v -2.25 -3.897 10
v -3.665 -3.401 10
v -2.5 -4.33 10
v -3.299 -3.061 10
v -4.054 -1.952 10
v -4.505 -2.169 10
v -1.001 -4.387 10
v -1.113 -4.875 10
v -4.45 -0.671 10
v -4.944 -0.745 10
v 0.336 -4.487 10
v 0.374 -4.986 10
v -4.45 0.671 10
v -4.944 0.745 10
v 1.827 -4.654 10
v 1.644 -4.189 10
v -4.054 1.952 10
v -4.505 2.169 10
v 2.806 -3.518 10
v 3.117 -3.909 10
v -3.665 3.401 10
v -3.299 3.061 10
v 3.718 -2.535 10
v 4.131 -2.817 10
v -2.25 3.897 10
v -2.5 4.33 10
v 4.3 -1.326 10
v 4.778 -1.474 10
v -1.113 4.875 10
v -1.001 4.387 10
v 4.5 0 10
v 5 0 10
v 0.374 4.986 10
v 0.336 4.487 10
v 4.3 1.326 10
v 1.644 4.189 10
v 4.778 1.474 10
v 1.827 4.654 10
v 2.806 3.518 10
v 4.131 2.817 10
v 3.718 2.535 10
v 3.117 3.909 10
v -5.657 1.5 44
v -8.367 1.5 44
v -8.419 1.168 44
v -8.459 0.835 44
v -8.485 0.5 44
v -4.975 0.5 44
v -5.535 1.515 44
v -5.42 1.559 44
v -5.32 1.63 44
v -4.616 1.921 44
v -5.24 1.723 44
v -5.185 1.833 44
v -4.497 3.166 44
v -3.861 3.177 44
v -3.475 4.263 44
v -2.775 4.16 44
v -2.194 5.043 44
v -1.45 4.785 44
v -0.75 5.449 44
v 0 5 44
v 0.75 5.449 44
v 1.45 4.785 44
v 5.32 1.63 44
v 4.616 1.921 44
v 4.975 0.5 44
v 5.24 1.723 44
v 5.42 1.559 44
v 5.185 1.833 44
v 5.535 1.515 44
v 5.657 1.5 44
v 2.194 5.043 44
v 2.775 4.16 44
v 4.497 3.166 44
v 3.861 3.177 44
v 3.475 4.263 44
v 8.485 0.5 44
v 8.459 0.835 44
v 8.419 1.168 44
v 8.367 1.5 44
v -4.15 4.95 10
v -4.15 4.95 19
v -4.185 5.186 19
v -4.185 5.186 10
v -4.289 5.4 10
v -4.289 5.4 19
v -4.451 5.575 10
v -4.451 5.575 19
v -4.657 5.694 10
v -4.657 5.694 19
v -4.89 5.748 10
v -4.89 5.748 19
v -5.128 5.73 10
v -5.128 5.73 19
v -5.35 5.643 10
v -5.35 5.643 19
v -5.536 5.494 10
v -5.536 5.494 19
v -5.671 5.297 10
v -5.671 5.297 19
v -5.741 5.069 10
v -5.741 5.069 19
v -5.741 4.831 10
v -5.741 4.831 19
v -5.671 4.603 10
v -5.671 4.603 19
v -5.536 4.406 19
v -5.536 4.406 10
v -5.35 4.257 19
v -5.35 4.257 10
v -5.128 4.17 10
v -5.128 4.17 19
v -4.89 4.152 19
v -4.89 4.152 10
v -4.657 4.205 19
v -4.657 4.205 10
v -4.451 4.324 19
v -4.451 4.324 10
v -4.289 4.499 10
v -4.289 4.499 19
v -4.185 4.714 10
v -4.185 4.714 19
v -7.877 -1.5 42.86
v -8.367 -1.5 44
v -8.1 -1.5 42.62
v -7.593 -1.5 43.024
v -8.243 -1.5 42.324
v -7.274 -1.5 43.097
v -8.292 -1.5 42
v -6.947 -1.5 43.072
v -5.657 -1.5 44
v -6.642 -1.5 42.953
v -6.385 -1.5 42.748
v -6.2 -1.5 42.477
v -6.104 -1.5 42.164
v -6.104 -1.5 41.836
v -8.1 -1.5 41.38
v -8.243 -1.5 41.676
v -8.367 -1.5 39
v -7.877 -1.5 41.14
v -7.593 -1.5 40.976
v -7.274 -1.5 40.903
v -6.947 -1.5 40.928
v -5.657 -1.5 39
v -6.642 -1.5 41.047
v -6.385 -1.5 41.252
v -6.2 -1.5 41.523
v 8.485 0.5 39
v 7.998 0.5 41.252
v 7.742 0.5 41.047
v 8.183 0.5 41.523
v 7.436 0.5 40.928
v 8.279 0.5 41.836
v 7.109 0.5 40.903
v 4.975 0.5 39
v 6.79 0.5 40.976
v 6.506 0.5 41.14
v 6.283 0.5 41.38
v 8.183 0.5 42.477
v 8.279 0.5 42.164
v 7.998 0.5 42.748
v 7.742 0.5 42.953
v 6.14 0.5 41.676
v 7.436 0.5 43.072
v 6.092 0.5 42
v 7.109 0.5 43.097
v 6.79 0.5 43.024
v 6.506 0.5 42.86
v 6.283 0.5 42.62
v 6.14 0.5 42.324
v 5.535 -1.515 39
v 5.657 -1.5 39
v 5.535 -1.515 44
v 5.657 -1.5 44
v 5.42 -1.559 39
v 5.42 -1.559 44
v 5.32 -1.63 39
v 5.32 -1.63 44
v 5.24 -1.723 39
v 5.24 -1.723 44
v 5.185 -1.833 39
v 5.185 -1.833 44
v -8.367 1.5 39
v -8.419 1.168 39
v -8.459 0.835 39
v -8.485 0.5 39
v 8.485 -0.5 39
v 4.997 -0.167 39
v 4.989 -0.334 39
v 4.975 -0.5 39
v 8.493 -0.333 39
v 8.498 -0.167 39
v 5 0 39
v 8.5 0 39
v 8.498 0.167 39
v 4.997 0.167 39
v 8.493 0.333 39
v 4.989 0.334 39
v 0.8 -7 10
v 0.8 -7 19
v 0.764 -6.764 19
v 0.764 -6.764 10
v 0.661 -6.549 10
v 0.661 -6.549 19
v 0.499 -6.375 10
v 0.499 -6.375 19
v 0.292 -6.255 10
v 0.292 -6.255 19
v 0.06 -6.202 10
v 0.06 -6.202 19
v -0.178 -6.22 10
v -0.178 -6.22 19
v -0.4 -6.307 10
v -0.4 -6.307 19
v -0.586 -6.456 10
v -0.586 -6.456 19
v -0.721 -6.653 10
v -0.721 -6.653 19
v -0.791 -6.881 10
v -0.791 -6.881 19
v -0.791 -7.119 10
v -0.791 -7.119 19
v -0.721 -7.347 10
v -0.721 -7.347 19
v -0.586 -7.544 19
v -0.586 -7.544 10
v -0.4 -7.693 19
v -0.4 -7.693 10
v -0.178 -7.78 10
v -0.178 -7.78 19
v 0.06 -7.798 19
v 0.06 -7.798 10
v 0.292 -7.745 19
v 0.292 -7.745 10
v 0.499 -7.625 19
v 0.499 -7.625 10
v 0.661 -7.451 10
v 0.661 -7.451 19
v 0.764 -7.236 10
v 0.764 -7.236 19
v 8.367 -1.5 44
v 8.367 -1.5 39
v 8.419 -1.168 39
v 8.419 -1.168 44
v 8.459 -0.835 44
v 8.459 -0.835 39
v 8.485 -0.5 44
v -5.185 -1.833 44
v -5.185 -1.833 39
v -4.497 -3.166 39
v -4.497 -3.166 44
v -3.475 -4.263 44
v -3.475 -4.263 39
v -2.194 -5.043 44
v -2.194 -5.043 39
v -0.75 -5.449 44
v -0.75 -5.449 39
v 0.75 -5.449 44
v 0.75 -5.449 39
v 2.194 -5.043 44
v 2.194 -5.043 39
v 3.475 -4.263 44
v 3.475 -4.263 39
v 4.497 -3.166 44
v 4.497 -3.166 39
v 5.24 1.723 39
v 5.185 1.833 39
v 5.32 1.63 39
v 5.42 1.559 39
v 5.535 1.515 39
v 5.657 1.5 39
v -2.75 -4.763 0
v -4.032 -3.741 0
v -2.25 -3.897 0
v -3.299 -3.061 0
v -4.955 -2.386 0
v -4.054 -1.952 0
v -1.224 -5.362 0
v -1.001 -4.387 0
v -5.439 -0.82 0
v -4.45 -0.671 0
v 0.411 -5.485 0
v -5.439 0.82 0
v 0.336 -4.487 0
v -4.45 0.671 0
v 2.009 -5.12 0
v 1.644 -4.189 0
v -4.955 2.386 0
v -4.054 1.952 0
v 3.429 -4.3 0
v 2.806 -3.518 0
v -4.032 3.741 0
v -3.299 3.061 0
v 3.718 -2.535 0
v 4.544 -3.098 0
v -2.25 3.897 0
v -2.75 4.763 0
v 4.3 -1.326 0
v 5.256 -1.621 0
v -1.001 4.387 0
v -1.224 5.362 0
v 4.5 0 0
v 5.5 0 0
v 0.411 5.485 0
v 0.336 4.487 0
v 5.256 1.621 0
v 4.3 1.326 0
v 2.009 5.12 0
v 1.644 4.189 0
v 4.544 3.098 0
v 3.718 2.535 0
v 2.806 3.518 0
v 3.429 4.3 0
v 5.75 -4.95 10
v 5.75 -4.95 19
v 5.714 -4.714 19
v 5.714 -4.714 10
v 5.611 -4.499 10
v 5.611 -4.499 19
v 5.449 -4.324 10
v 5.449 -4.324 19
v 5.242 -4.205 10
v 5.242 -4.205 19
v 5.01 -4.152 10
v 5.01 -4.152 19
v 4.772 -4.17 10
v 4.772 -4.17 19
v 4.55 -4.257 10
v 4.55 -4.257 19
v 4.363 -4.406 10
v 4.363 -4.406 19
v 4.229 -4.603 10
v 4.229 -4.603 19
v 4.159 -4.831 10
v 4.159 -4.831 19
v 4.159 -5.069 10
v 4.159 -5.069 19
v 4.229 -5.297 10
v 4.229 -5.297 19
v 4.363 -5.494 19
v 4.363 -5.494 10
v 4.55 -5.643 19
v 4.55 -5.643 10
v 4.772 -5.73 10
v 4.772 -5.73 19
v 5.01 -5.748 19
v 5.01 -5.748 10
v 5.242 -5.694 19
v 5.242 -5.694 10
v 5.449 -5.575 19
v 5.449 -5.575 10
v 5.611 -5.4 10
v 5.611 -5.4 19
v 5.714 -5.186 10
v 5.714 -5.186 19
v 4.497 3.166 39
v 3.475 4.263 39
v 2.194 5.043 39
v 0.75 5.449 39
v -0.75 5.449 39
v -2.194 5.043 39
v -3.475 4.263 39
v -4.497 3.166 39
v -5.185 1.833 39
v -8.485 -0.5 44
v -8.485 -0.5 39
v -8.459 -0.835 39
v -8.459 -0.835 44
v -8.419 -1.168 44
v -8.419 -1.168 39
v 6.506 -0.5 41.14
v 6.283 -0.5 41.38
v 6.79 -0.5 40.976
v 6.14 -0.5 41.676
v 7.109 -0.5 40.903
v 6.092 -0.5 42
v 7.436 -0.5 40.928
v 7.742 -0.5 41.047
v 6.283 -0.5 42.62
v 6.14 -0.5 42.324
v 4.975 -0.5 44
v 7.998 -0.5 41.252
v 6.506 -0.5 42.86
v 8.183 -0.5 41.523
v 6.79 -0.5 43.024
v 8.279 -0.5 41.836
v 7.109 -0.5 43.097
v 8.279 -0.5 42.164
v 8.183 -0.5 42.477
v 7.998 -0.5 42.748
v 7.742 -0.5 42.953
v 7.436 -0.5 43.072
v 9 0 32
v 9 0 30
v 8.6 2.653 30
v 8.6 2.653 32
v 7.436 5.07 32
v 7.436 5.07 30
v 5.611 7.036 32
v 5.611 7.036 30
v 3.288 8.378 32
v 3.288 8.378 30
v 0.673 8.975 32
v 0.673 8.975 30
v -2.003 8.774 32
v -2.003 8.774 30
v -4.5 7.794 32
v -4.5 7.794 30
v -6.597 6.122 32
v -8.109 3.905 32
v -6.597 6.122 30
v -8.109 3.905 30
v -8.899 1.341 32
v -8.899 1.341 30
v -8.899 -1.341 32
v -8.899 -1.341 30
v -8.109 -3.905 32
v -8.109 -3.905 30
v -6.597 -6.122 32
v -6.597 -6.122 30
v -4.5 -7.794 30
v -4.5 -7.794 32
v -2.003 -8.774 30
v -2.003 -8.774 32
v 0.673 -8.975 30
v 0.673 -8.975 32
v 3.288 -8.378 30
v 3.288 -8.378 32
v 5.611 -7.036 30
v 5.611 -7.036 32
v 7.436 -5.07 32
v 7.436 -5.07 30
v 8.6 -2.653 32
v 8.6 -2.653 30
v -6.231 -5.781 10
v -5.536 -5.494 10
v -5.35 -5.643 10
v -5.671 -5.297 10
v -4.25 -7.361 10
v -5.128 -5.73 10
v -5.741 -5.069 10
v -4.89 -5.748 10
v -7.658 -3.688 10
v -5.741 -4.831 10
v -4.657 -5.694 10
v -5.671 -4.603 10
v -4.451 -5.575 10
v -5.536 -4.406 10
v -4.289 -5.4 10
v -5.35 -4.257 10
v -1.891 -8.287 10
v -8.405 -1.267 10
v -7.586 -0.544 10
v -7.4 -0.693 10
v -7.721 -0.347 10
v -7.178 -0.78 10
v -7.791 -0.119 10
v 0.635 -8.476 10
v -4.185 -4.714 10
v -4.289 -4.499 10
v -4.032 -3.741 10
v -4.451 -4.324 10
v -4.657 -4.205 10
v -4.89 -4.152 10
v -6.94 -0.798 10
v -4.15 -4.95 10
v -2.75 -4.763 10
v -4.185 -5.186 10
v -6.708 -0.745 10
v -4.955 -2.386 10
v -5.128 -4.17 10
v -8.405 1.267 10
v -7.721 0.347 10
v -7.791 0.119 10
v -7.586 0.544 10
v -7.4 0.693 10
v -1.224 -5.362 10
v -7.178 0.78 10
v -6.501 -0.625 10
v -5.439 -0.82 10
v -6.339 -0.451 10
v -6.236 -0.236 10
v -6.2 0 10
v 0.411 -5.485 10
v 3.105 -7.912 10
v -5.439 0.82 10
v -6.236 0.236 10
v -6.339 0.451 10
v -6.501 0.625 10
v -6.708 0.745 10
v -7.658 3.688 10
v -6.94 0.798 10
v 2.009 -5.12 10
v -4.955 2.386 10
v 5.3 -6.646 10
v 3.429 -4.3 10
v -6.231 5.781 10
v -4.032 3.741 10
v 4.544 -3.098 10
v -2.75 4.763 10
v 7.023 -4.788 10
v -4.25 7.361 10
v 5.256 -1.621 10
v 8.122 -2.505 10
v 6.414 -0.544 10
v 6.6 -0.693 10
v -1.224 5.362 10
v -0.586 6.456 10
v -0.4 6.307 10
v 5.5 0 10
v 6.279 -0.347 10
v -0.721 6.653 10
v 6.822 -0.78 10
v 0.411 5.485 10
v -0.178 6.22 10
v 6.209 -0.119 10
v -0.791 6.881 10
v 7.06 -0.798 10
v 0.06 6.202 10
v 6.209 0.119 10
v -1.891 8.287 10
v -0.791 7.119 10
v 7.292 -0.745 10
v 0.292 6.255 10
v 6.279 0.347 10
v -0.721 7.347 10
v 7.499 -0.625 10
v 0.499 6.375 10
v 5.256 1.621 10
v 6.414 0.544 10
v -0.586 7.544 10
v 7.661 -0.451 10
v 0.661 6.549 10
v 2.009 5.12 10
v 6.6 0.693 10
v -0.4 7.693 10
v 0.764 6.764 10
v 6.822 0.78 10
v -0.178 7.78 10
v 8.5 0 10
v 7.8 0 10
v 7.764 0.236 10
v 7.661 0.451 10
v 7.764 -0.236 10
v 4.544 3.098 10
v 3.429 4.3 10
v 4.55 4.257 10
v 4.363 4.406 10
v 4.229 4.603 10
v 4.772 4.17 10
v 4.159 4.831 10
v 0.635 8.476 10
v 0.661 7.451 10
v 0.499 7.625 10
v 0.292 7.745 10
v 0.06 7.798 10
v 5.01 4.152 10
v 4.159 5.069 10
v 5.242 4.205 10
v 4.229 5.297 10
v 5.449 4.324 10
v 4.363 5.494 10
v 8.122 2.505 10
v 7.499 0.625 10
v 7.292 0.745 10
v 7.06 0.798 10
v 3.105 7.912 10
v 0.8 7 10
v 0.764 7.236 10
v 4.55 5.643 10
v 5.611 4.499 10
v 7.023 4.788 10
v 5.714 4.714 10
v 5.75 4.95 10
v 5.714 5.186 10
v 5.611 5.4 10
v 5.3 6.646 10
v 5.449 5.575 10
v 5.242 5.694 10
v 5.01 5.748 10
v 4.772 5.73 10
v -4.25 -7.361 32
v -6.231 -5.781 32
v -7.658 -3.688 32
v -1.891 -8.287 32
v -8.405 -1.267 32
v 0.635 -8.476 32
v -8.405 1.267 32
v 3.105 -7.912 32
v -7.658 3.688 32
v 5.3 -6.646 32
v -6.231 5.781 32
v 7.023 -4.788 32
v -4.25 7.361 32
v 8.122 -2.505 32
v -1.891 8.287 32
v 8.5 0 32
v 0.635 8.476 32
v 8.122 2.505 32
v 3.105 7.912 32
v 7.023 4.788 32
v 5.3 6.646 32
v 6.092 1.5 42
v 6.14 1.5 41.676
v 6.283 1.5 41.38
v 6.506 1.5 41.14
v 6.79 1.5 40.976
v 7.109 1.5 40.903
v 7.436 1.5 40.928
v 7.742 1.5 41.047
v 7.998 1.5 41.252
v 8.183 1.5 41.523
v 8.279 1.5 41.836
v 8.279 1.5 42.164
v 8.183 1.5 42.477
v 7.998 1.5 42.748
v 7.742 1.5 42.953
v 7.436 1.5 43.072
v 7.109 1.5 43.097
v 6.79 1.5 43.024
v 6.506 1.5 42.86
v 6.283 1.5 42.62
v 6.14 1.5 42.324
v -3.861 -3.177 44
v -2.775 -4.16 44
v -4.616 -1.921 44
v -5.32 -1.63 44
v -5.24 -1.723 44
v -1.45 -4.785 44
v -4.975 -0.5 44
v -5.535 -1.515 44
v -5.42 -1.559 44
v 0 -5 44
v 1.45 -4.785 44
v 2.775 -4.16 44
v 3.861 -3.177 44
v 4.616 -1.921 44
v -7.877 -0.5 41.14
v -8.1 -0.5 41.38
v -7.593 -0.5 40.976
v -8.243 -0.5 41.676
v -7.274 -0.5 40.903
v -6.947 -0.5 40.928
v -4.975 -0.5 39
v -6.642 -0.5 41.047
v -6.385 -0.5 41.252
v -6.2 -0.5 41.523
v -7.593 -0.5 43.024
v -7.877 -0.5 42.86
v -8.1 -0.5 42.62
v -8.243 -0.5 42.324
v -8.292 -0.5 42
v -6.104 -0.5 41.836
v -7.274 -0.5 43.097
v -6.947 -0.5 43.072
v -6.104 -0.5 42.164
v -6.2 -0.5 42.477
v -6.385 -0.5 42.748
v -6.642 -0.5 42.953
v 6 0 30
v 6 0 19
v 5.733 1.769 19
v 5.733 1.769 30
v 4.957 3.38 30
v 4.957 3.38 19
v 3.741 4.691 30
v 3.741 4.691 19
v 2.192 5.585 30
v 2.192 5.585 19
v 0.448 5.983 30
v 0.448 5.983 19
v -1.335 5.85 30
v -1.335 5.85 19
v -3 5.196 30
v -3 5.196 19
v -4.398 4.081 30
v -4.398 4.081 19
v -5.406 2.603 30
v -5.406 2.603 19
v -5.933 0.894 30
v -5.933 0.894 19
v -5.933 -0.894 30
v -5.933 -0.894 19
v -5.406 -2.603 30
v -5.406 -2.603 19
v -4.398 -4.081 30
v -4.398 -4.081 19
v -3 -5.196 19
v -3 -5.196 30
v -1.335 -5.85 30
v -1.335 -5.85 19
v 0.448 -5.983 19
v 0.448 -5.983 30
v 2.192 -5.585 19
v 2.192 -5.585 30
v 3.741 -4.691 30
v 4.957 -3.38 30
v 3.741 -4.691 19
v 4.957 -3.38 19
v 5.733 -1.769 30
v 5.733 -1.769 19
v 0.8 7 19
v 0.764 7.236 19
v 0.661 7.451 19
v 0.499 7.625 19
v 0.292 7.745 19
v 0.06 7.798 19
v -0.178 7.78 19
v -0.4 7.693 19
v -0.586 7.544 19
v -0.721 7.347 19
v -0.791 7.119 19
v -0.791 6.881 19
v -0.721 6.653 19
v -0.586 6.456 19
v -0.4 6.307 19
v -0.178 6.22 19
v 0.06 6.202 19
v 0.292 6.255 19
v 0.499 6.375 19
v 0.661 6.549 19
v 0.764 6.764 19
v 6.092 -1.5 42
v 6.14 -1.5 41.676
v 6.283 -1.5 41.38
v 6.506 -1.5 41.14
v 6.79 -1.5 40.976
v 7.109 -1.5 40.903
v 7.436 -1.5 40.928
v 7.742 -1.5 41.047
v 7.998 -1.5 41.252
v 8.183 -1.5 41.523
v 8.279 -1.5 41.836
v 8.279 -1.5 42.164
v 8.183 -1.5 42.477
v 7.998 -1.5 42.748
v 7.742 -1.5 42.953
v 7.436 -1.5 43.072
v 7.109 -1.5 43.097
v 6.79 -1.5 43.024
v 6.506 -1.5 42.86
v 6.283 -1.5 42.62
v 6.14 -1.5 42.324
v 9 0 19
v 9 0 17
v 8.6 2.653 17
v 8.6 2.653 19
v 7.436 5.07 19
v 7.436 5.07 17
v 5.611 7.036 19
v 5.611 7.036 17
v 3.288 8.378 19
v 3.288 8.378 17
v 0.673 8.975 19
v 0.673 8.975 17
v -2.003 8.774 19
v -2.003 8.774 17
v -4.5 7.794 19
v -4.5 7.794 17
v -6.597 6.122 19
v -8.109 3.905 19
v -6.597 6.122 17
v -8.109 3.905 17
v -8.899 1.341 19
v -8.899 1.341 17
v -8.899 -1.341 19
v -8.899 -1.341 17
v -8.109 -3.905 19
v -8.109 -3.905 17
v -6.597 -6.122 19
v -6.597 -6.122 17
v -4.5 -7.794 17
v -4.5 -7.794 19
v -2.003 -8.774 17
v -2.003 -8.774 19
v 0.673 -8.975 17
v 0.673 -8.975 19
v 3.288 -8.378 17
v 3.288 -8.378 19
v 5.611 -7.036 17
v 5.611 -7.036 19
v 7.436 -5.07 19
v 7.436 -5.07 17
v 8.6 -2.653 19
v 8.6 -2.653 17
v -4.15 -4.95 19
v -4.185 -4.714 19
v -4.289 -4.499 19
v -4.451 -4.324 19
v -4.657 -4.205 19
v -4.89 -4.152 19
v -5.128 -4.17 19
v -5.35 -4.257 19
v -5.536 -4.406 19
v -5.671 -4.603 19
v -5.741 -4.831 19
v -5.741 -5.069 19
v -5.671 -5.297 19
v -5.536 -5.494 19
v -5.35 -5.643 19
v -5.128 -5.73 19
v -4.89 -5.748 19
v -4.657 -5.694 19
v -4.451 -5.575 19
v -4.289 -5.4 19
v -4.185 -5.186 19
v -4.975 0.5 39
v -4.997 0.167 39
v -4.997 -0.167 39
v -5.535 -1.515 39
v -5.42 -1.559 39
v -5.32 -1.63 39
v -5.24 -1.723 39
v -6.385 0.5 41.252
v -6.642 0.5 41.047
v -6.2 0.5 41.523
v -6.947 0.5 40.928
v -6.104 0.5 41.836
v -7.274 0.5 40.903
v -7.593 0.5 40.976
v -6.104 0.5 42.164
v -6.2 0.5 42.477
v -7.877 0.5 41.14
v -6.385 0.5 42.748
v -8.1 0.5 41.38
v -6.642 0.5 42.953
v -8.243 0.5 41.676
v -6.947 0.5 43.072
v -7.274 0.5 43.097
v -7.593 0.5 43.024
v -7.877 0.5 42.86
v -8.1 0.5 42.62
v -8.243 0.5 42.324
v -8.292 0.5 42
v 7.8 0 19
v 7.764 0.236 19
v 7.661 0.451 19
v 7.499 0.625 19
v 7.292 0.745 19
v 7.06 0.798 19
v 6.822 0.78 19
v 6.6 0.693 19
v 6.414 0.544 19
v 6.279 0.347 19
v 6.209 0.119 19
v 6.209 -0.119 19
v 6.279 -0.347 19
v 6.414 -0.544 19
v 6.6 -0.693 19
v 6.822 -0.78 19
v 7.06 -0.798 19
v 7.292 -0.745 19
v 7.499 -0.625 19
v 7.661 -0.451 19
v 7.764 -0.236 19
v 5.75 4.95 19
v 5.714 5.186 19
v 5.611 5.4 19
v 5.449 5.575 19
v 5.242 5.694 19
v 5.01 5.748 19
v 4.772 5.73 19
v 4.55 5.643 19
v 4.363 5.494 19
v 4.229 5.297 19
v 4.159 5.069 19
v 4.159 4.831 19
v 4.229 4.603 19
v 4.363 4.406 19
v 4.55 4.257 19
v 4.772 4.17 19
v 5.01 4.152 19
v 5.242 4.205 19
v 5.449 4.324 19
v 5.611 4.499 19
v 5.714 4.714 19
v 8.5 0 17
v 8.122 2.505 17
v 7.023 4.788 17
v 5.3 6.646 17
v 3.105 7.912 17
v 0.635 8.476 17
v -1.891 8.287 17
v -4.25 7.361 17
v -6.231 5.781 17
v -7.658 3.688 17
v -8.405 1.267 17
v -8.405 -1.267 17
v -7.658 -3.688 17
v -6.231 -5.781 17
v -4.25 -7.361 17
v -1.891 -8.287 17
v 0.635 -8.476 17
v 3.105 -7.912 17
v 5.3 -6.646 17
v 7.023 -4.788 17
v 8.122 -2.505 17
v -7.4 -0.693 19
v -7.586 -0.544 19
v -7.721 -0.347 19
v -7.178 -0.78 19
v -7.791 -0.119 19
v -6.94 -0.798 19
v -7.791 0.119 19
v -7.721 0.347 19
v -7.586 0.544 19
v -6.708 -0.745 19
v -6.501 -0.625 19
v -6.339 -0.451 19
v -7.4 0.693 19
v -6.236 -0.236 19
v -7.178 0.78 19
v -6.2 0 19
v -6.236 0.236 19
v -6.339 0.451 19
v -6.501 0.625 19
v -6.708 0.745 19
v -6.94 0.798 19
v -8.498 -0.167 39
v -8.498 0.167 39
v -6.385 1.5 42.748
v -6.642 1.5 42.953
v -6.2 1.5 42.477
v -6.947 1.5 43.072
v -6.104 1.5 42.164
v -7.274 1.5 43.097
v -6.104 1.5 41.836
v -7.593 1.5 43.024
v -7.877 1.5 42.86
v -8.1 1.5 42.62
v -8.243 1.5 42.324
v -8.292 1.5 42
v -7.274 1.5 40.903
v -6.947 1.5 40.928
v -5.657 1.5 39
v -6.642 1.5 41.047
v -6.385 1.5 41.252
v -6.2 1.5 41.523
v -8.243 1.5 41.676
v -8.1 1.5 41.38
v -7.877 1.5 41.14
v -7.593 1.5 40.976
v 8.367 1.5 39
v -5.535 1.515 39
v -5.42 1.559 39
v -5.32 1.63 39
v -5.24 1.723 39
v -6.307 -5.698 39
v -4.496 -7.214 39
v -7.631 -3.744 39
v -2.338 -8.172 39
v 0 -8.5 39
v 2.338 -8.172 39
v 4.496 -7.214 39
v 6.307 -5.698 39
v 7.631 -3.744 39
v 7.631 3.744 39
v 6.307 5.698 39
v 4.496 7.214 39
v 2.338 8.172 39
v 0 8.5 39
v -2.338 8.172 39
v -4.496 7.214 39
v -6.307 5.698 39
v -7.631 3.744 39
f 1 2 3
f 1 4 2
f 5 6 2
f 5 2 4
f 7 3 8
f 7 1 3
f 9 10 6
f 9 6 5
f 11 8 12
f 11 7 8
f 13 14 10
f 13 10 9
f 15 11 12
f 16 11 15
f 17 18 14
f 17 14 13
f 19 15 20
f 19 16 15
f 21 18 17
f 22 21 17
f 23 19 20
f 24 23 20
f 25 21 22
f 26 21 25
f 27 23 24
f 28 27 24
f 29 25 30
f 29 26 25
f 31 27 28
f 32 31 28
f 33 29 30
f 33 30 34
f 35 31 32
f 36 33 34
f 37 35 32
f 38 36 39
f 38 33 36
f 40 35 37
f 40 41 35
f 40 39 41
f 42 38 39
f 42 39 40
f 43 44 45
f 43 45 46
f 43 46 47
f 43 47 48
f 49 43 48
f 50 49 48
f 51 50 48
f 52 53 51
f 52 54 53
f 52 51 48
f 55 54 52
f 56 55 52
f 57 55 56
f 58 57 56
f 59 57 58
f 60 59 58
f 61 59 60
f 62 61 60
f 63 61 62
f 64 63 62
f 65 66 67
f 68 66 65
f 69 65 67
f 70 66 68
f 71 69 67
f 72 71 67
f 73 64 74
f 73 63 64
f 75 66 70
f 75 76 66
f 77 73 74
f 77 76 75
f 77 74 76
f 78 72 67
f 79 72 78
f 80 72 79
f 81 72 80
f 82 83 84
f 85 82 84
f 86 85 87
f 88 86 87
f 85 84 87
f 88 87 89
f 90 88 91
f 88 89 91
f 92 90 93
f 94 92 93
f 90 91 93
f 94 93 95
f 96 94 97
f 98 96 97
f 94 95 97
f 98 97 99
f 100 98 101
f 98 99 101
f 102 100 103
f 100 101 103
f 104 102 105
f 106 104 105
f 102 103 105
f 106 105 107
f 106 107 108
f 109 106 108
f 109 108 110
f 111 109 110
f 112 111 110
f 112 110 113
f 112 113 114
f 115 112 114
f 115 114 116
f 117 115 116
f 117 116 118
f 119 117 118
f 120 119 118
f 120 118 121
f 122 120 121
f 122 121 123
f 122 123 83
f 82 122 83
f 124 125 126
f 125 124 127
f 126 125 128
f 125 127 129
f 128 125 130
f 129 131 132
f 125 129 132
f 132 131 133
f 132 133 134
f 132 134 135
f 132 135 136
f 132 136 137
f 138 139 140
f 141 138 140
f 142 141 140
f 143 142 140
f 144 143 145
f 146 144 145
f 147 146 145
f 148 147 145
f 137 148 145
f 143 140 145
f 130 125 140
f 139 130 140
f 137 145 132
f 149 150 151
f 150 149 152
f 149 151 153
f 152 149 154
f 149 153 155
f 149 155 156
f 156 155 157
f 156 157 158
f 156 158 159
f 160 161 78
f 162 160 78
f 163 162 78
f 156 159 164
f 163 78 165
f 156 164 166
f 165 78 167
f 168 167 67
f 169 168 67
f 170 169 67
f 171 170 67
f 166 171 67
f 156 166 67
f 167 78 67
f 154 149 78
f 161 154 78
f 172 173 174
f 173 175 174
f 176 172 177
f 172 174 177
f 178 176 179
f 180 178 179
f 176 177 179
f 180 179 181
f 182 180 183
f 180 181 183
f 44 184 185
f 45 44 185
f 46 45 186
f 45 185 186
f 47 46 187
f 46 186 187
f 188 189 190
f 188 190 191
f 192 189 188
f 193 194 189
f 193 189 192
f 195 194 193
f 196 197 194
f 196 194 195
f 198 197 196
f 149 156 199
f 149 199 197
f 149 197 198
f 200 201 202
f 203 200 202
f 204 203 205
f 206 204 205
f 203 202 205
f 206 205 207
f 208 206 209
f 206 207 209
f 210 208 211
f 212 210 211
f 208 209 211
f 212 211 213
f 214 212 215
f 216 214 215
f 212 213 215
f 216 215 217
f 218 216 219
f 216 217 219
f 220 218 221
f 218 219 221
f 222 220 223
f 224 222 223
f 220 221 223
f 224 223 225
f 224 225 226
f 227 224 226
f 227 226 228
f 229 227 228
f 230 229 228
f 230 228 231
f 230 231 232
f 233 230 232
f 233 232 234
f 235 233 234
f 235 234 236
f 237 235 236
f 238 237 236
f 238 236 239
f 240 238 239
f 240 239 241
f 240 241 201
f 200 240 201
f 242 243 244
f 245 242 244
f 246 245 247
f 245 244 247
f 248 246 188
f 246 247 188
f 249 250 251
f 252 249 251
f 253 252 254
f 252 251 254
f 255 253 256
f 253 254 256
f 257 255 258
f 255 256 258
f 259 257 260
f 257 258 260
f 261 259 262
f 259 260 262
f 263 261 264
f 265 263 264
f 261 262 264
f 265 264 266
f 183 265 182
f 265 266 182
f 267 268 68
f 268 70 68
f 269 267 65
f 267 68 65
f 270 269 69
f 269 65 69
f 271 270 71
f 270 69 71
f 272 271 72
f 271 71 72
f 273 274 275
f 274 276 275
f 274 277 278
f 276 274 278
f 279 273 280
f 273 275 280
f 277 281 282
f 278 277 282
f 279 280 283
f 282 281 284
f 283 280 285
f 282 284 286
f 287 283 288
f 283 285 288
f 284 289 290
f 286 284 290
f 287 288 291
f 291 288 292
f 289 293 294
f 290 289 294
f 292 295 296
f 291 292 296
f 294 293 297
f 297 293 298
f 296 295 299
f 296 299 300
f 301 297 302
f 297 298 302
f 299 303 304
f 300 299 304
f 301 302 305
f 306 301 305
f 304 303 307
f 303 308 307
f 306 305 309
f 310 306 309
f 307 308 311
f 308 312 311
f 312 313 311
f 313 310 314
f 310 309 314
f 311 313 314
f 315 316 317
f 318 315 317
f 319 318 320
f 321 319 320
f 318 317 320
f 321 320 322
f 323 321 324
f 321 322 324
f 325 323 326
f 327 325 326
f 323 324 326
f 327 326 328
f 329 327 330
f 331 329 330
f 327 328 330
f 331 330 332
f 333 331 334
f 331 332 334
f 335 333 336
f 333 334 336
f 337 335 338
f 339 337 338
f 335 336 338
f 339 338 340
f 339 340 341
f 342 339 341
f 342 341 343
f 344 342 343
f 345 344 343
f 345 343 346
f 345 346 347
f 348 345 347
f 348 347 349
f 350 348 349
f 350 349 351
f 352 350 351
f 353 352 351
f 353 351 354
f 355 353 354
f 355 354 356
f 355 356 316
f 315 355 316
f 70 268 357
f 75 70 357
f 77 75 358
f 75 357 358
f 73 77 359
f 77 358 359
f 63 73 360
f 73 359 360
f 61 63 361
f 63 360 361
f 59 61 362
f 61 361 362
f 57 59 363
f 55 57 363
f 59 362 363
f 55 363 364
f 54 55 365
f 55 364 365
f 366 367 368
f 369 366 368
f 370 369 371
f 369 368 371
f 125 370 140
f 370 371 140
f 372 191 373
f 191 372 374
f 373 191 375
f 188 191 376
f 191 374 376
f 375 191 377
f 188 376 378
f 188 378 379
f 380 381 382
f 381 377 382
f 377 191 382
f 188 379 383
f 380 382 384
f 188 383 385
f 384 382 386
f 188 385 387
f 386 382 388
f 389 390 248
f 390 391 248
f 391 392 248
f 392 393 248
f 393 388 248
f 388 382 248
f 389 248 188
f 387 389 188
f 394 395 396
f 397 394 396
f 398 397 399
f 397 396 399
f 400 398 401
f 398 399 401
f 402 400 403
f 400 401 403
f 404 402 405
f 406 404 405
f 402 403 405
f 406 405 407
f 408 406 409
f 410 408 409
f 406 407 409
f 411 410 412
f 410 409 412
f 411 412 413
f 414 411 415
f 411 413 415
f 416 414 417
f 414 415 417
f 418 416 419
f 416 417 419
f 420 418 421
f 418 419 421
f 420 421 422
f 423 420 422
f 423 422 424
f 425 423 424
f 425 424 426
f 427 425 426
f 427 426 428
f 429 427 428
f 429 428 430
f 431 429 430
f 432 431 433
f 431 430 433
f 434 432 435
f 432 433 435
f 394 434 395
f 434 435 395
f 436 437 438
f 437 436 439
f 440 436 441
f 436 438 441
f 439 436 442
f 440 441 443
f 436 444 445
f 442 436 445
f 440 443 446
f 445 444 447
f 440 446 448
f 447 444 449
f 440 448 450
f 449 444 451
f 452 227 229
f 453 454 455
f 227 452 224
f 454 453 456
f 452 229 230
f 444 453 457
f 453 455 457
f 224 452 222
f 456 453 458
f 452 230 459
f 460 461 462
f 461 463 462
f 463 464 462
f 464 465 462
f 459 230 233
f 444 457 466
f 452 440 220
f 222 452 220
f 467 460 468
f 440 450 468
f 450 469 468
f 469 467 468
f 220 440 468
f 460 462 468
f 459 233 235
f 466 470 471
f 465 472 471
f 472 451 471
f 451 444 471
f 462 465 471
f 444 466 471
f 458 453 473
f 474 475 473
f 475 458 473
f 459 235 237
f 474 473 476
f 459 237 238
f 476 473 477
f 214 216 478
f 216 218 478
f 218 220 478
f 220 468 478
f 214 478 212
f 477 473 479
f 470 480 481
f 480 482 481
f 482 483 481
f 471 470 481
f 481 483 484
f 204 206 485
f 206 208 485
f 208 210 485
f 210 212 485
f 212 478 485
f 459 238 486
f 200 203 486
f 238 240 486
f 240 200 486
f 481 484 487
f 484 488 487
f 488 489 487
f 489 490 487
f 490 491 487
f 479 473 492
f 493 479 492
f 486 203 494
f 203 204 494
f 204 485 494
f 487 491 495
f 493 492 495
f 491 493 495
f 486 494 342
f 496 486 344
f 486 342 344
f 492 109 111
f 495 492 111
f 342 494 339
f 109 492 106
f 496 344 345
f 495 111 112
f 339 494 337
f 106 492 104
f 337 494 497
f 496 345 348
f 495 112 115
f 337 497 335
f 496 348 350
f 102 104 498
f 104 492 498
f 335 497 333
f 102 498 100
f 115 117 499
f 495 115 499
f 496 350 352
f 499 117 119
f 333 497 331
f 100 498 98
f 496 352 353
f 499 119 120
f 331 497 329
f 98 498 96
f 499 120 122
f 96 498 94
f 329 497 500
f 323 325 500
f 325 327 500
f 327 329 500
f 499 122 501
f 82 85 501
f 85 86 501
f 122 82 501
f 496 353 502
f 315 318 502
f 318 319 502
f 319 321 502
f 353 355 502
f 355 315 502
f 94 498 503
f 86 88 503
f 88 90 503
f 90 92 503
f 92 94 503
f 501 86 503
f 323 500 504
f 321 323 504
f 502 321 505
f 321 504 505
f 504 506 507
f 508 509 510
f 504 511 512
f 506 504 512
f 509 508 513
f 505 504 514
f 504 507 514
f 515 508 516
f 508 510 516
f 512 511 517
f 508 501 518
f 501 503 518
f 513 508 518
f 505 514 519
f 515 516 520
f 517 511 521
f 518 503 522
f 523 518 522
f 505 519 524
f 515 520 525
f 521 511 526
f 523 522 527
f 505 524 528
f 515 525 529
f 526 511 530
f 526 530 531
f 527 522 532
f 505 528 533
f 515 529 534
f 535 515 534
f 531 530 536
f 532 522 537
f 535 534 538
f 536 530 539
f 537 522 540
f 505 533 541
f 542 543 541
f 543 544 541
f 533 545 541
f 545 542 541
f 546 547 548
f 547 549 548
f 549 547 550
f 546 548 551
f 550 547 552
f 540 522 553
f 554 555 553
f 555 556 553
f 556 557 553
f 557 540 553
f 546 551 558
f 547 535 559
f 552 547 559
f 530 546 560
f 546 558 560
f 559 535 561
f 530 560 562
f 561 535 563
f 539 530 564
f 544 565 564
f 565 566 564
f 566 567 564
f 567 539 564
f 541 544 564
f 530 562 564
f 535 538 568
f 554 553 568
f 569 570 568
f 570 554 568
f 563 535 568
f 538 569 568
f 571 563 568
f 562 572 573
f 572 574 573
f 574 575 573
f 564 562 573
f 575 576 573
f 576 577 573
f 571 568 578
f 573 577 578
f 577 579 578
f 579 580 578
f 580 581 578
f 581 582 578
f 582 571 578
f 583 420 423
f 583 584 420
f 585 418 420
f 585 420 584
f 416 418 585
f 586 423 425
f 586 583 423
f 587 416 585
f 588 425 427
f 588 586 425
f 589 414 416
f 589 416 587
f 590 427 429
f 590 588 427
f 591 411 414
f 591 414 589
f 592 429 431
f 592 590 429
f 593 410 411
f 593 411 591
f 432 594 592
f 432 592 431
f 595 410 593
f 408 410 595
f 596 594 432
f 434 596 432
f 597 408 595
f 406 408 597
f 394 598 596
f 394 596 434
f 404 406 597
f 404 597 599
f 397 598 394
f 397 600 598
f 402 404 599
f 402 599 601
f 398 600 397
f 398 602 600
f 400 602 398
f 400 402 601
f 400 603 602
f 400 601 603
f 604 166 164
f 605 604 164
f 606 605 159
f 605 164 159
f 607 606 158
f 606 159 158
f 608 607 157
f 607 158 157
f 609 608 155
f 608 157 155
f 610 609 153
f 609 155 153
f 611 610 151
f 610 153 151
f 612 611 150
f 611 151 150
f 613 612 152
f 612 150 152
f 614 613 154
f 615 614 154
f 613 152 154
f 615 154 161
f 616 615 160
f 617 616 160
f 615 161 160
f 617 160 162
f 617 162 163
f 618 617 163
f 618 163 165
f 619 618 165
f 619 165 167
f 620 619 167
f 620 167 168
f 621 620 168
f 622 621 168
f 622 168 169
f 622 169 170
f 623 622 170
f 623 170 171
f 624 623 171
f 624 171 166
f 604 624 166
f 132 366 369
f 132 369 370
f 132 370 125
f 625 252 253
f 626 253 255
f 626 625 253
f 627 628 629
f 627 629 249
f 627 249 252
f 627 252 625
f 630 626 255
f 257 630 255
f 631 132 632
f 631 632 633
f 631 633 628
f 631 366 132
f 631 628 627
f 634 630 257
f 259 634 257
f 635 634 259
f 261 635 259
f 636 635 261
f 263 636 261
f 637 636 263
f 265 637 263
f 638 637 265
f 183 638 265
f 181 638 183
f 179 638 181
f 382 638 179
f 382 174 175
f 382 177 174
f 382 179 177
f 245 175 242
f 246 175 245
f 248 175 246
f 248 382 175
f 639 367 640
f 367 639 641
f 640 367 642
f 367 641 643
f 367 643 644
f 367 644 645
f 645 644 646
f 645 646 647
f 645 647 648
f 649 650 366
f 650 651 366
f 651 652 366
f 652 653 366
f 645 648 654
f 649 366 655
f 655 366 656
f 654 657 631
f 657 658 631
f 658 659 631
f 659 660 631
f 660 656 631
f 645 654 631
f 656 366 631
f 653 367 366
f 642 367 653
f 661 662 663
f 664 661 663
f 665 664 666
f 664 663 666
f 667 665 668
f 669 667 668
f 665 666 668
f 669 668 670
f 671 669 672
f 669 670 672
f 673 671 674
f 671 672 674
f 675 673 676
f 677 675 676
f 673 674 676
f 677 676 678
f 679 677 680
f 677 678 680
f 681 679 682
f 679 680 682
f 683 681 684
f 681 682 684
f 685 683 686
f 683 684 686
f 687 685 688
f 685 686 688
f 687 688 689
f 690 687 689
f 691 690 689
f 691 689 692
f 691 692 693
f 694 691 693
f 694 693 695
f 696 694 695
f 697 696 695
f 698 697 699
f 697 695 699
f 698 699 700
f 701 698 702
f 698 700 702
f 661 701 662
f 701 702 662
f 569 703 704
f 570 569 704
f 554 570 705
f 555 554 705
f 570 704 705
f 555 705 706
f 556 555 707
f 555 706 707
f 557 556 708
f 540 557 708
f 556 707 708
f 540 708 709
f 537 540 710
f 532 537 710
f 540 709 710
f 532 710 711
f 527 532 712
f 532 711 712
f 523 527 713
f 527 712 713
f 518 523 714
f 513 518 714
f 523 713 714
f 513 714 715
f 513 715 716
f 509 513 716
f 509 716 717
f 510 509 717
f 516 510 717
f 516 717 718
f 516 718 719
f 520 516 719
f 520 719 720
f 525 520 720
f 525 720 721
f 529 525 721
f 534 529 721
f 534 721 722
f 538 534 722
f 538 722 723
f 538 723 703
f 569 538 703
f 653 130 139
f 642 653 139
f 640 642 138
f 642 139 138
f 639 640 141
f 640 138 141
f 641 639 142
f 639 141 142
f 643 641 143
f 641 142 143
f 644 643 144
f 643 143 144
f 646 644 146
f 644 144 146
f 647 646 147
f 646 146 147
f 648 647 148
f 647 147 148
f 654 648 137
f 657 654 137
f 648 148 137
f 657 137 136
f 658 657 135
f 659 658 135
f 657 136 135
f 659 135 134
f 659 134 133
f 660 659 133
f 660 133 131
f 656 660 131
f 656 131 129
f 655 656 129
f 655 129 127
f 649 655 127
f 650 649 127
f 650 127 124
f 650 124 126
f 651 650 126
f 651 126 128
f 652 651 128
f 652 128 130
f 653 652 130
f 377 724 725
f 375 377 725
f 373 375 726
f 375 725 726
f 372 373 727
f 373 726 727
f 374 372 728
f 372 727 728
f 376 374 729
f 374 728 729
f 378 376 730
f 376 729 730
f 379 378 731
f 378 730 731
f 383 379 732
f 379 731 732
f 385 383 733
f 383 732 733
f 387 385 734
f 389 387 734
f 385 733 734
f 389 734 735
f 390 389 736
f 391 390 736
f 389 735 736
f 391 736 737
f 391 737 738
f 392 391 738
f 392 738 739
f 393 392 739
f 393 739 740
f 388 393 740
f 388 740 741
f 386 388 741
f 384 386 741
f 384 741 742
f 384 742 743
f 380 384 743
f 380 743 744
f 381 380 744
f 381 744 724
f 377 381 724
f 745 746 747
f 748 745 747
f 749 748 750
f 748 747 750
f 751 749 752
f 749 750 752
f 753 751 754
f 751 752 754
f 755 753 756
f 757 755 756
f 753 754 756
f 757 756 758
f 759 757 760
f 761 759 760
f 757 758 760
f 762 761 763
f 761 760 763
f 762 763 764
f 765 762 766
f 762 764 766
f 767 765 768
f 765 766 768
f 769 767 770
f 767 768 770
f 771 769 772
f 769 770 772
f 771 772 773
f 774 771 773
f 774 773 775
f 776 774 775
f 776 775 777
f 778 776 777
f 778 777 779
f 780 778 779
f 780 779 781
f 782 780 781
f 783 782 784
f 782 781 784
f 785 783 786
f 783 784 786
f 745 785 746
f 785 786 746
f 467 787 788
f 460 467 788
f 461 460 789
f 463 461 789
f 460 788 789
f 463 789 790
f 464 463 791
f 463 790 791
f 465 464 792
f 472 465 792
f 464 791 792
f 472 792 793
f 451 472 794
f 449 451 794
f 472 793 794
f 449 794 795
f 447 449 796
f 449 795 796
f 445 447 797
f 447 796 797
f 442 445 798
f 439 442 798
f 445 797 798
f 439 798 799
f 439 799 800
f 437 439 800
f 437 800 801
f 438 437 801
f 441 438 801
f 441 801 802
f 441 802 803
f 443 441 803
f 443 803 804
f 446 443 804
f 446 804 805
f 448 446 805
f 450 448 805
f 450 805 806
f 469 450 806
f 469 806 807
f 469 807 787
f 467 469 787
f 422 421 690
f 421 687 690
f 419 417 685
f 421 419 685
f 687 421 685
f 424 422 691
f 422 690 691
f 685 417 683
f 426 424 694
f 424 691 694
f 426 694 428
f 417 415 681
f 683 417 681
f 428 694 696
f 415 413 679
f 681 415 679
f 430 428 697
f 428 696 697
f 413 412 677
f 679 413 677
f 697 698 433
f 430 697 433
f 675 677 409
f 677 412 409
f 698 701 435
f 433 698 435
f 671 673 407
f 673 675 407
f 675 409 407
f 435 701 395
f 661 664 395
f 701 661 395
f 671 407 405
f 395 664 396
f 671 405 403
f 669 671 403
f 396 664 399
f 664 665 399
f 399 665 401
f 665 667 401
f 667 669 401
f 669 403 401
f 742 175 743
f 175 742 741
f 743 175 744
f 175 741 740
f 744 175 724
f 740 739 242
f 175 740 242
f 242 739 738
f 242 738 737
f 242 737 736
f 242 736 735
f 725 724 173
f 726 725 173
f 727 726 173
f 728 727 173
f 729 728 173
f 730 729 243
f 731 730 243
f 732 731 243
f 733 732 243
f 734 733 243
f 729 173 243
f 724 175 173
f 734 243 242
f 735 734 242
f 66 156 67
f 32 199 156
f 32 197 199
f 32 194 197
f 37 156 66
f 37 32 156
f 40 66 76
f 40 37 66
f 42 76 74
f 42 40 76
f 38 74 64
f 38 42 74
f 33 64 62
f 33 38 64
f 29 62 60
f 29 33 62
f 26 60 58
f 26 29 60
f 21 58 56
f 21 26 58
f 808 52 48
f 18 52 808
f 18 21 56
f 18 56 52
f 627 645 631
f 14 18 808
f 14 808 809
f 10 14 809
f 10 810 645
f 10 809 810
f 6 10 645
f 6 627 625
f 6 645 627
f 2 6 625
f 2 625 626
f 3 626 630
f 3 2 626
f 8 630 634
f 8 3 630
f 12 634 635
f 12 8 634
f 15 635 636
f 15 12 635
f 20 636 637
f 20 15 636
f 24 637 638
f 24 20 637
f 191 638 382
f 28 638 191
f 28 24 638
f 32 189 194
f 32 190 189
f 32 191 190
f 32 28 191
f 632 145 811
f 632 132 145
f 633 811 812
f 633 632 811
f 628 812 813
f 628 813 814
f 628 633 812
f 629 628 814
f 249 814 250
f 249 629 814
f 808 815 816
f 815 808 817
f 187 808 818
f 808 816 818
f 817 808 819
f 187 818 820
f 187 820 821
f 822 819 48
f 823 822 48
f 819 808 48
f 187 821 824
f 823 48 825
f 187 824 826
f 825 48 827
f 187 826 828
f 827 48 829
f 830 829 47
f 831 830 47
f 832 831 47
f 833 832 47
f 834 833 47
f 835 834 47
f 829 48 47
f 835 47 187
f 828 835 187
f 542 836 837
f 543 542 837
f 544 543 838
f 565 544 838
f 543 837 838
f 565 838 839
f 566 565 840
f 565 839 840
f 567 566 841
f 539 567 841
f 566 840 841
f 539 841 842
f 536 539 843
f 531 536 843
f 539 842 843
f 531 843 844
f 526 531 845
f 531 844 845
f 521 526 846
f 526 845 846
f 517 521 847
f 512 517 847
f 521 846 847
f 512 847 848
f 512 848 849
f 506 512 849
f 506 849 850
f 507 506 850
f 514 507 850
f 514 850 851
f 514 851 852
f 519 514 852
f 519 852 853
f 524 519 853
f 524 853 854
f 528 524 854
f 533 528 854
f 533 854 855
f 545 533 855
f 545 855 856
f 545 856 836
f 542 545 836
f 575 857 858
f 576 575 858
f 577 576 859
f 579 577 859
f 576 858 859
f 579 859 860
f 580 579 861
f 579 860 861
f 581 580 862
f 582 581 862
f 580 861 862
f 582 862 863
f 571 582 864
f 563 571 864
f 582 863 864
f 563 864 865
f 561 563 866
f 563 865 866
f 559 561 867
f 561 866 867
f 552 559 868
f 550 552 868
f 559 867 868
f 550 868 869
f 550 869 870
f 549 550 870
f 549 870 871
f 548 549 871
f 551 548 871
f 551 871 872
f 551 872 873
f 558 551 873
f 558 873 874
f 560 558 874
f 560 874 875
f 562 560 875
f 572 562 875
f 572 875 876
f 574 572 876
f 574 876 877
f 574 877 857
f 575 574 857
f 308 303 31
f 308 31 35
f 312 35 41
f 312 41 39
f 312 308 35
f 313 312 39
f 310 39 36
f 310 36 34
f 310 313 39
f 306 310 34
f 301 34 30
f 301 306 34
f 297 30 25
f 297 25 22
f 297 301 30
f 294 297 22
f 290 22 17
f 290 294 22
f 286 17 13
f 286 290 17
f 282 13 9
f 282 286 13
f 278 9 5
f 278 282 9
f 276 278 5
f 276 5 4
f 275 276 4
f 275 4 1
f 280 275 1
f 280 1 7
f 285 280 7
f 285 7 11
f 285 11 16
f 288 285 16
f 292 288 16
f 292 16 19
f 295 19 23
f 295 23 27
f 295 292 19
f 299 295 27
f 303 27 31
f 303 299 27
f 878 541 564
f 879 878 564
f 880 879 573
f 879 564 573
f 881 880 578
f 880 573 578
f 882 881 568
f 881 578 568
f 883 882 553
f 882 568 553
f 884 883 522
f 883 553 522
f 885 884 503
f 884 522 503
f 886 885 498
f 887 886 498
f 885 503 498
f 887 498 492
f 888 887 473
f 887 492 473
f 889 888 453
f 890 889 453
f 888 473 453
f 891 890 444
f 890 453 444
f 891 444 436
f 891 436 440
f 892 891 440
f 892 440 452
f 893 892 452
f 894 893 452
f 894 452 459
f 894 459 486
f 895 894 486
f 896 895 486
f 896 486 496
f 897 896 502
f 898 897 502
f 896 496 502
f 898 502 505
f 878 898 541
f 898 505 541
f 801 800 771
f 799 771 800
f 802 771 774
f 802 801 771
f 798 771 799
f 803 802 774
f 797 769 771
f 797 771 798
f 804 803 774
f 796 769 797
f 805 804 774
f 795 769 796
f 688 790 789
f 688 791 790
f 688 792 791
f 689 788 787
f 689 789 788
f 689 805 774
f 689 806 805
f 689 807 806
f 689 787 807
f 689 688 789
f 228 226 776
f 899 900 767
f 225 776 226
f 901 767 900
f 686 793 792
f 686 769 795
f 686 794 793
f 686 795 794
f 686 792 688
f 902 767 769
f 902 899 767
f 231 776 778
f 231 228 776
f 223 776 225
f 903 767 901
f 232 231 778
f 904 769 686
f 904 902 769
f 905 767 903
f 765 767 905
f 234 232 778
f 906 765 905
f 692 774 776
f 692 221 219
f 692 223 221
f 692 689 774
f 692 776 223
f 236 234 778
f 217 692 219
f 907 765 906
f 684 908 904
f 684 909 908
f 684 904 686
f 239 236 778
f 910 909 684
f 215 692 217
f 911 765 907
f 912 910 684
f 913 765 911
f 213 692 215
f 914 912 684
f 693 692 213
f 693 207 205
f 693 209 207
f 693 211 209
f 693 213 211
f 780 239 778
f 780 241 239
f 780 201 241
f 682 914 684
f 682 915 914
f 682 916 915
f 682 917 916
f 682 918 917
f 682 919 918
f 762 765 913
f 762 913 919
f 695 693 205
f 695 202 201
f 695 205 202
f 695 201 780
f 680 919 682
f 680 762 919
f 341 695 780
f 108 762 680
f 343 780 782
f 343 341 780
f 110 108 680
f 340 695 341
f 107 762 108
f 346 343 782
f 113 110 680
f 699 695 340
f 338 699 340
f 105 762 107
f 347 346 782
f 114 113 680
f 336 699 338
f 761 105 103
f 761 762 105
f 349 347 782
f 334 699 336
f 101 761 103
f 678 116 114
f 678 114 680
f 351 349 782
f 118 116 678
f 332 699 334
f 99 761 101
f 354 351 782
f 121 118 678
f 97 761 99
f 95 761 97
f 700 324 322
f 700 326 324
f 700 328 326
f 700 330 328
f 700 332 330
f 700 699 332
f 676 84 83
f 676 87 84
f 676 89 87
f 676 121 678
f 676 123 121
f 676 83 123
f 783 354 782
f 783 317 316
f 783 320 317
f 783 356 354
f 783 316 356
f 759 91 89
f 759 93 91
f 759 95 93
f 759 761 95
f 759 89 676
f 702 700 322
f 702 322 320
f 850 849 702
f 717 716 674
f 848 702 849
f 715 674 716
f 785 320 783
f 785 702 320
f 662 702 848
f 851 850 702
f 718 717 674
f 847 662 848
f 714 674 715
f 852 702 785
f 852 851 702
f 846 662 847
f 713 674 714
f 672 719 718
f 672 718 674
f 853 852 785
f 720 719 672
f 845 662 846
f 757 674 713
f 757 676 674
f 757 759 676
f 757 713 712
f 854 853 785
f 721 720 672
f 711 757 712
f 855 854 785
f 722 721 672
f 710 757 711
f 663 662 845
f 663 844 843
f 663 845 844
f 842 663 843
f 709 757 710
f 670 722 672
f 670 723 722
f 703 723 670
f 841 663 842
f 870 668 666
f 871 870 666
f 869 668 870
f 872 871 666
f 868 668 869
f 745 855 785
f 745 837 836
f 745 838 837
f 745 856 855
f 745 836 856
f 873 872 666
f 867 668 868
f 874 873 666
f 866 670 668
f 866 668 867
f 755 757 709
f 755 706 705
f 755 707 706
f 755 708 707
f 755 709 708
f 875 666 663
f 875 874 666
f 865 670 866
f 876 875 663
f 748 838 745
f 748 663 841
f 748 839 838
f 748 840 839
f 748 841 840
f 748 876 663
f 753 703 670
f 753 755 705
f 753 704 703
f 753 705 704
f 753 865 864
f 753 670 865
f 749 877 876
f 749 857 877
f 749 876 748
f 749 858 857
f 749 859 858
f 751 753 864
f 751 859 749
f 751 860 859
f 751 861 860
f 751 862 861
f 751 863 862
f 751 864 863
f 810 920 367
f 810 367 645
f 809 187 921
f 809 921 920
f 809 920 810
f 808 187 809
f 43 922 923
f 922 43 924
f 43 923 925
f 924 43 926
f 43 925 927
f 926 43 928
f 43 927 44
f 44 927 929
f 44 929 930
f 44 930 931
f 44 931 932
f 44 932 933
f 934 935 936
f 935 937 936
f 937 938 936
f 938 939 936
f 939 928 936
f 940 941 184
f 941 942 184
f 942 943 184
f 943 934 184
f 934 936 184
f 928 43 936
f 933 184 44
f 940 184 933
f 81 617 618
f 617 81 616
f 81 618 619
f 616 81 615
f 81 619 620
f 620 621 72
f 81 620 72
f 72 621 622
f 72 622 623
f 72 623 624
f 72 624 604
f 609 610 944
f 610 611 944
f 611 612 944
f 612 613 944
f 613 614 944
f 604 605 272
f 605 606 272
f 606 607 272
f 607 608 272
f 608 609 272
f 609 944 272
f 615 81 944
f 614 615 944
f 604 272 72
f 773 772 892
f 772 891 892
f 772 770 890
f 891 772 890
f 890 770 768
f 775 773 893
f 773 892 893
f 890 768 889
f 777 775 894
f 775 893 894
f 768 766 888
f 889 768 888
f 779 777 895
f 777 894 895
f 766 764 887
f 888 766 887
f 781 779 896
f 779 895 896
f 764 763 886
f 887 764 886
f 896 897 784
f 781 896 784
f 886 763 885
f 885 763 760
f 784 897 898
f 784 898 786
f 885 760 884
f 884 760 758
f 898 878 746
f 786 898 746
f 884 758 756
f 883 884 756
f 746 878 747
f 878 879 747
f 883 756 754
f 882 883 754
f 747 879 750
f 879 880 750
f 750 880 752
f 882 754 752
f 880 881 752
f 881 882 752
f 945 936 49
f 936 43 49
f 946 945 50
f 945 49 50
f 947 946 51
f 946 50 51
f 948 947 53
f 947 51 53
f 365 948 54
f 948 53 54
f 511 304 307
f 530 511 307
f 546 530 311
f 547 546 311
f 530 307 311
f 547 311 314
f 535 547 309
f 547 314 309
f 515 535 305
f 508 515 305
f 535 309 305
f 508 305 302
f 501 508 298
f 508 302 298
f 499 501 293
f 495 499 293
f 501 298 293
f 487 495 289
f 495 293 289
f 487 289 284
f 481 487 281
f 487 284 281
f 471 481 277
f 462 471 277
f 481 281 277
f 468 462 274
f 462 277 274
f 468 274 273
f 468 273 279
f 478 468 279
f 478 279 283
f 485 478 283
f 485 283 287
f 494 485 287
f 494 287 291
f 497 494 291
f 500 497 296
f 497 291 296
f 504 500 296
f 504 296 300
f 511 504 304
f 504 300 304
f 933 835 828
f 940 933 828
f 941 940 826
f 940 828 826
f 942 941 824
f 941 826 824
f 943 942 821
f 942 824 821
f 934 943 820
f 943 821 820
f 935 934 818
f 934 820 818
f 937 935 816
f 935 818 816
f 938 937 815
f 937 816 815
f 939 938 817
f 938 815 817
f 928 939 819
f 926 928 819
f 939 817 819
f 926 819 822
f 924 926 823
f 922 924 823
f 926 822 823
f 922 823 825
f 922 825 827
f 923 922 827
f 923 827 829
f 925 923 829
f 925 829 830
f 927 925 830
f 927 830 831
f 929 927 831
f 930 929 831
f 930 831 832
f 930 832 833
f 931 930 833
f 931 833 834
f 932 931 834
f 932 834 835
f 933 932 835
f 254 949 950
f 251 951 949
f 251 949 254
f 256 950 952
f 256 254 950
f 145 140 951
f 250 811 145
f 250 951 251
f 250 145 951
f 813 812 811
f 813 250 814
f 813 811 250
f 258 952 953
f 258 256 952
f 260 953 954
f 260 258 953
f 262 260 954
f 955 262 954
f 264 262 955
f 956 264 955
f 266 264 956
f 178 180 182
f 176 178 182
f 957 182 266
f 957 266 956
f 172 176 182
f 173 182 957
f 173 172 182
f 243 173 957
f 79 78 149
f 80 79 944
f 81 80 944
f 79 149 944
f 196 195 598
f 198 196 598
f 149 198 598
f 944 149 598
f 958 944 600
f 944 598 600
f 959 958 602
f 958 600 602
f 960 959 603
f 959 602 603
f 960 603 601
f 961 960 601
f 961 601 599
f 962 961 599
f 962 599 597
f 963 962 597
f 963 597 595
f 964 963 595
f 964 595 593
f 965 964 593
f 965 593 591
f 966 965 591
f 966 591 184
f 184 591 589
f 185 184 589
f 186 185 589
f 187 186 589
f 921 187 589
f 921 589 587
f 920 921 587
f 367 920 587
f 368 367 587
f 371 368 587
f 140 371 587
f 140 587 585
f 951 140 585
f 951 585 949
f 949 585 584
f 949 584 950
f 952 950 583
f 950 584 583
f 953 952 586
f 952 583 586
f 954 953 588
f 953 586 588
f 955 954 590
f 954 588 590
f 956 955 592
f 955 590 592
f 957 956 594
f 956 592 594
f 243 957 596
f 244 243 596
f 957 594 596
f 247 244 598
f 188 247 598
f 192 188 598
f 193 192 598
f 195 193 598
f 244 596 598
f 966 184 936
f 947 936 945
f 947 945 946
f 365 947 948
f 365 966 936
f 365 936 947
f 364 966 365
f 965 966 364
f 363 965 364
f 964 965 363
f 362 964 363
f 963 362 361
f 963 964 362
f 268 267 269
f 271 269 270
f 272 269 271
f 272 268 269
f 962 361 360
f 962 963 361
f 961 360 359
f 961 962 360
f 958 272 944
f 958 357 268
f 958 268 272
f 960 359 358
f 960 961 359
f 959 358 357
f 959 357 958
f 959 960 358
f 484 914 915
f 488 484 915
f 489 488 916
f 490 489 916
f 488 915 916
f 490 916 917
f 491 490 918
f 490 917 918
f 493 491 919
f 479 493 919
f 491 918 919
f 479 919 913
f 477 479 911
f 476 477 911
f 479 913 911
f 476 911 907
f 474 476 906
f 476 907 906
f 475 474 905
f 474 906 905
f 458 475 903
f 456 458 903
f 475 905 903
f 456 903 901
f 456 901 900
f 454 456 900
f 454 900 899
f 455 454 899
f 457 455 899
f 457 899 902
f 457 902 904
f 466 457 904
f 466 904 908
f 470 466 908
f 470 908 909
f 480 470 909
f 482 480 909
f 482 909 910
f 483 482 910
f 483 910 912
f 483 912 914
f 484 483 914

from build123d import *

# Parameters (mm, degrees)
ESQUISSE1_R                                   = 5.5
ESQUISSE1_R_2                                 = 4.5
BOSS_EXTRU_1_DEPTH                            = 10
ESQUISSE3_R                                   = 8.5
ESQUISSE3_R_2                                 = 5
BOSS_EXTRU_3_DEPTH                            = 7
ESQUISSE4_R                                   = 9
ESQUISSE4_R_2                                 = 5
BOSS_EXTRU_4_DEPTH                            = 2
ESQUISSE7_R                                   = 6
ESQUISSE7_R_2                                 = 5
BOSS_EXTRU_7_DEPTH                            = 11
ESQUISSE8_R                                   = 9
ESQUISSE8_R_2                                 = 5
BOSS_EXTRU_8_DEPTH                            = 2
ESQUISSE15_R                                  = 8.5
ESQUISSE15_R_2                                = 5
BOSS_EXTRU_9_DEPTH                            = 7
ESQUISSE16_R                                  = 5
BOSS_EXTRU_10_DEPTH                           = 5
TROU_POUR_TARAUDAGE_POUR_TROU_TARAUD_M2_D     = 1.6
TROU_POUR_TARAUDAGE_POUR_TROU_TARAUD_M2_DEPTH = 9
ENL_V_MAT_EXTRU_1_DEPTH                       = 5
D_GAGEMENT_M21_D                              = 2.2
CONG_1_R                                      = 0.5


with BuildPart() as part:
    # Esquisse1 → Boss.-Extru.1 (new body)
    with BuildSketch(Plane.XY):
        Circle(ESQUISSE1_R)
        Circle(ESQUISSE1_R_2, mode=Mode.SUBTRACT)
    extrude(amount=BOSS_EXTRU_1_DEPTH)

    # Esquisse3 → Boss.-Extru.3 (add)
    with BuildSketch(Plane.XY.offset(10)):
        Circle(ESQUISSE3_R)
        Circle(ESQUISSE3_R_2, mode=Mode.SUBTRACT)
    extrude(amount=BOSS_EXTRU_3_DEPTH)

    # Esquisse4 → Boss.-Extru.4 (add)
    with BuildSketch(Plane.XY.offset(17)):
        Circle(ESQUISSE4_R)
        Circle(ESQUISSE4_R_2, mode=Mode.SUBTRACT)
    extrude(amount=BOSS_EXTRU_4_DEPTH)

    # Esquisse7 → Boss.-Extru.7 (add)
    with BuildSketch(Plane.XY.offset(19)):
        Circle(ESQUISSE7_R)
        Circle(ESQUISSE7_R_2, mode=Mode.SUBTRACT)
    extrude(amount=BOSS_EXTRU_7_DEPTH)

    # Esquisse8 → Boss.-Extru.8 (add)
    with BuildSketch(Plane.XY.offset(30)):
        Circle(ESQUISSE8_R)
        Circle(ESQUISSE8_R_2, mode=Mode.SUBTRACT)
    extrude(amount=BOSS_EXTRU_8_DEPTH)

    # Esquisse15 → Boss.-Extru.9 (add)
    with BuildSketch(Plane.XY.offset(32)):
        Circle(ESQUISSE15_R)
        Circle(ESQUISSE15_R_2, mode=Mode.SUBTRACT)
    extrude(amount=BOSS_EXTRU_9_DEPTH)

    # Esquisse16 → Boss.-Extru.10 (add)
    with BuildSketch(Plane.XY.offset(39)):
        with BuildLine():
            Line((-5.291502622, 1.5), (-8.366600265, 1.5))
            ThreePointArc((-8.366600265, 1.5), (-8.5, 0), (-8.366600265, -1.5))
            Line((-8.366600265, -1.5), (-5.291502622, -1.5))
            ThreePointArc((-5.291502622, -1.5), (0, -5.5), (5.291502622, -1.5))
            Line((5.291502622, -1.5), (8.366600265, -1.5))
            ThreePointArc((8.366600265, -1.5), (8.5, 0), (8.366600265, 1.5))
            Line((8.366600265, 1.5), (5.291502622, 1.5))
            ThreePointArc((5.291502622, 1.5), (0, 5.5), (-5.291502622, 1.5))
        make_face()
        Circle(ESQUISSE16_R, mode=Mode.SUBTRACT)
    extrude(amount=BOSS_EXTRU_10_DEPTH)

    # Trou pour taraudage pour trou taraudé M21
    with Locations(Plane(origin=(0, 0, 10), x_dir=(-1, 0, 0), z_dir=(0, 0, -1))):
        with Locations((-7, 0), (-4.949747468, 4.949747468), (0, 7), (4.949747468, 4.949747468), (7, 0), (4.949747468, -4.949747468), (0, -7), (-4.949747468, -4.949747468), (0, 0)):
            Hole(TROU_POUR_TARAUDAGE_POUR_TROU_TARAUD_M2_D / 2, depth=TROU_POUR_TARAUDAGE_POUR_TROU_TARAUD_M2_DEPTH)

    # Esquisse17 → Enlèv. mat.-Extru.1 (cut)
    with BuildSketch(Plane.XY.offset(44)):
        with BuildLine():
            Line((-4.974937186, 0.5), (-8.485281374, 0.5))
            ThreePointArc((-8.485281374, 0.5), (-8.5, 0), (-8.485281374, -0.5))
            Line((-8.485281374, -0.5), (-4.974937186, -0.5))
            ThreePointArc((-4.974937186, -0.5), (-5, 0), (-4.974937186, 0.5))
        make_face()
        with BuildLine():
            Line((8.485281374, 0.5), (4.974937186, 0.5))
            ThreePointArc((4.974937186, 0.5), (5, 0), (4.974937186, -0.5))
            Line((4.974937186, -0.5), (8.485281374, -0.5))
            ThreePointArc((8.485281374, -0.5), (8.5, 0), (8.485281374, 0.5))
        make_face()
    extrude(amount=-ENL_V_MAT_EXTRU_1_DEPTH, mode=Mode.SUBTRACT)

    # Dégagement M21 (through all)
    with Locations(Plane(origin=(0, 1.5, 0), x_dir=(1, 0, 0), z_dir=(0, 1, 0))):
        with Locations((7.191502622, -42), (-7.191502622, -42)):
            Hole(D_GAGEMENT_M21_D / 2)

    # Congé1
    cong_1_edges = [part.edges().sort_by_distance(p)[0] for p in [
        (5.291502622, 1.5, 41.5),
        (-5.291502622, 1.5, 41.5),
        (-5.291502622, -1.5, 41.5),
        (5.291502622, -1.5, 41.5),
    ]]
    fillet(cong_1_edges, radius=CONG_1_R)


solid = part.part
